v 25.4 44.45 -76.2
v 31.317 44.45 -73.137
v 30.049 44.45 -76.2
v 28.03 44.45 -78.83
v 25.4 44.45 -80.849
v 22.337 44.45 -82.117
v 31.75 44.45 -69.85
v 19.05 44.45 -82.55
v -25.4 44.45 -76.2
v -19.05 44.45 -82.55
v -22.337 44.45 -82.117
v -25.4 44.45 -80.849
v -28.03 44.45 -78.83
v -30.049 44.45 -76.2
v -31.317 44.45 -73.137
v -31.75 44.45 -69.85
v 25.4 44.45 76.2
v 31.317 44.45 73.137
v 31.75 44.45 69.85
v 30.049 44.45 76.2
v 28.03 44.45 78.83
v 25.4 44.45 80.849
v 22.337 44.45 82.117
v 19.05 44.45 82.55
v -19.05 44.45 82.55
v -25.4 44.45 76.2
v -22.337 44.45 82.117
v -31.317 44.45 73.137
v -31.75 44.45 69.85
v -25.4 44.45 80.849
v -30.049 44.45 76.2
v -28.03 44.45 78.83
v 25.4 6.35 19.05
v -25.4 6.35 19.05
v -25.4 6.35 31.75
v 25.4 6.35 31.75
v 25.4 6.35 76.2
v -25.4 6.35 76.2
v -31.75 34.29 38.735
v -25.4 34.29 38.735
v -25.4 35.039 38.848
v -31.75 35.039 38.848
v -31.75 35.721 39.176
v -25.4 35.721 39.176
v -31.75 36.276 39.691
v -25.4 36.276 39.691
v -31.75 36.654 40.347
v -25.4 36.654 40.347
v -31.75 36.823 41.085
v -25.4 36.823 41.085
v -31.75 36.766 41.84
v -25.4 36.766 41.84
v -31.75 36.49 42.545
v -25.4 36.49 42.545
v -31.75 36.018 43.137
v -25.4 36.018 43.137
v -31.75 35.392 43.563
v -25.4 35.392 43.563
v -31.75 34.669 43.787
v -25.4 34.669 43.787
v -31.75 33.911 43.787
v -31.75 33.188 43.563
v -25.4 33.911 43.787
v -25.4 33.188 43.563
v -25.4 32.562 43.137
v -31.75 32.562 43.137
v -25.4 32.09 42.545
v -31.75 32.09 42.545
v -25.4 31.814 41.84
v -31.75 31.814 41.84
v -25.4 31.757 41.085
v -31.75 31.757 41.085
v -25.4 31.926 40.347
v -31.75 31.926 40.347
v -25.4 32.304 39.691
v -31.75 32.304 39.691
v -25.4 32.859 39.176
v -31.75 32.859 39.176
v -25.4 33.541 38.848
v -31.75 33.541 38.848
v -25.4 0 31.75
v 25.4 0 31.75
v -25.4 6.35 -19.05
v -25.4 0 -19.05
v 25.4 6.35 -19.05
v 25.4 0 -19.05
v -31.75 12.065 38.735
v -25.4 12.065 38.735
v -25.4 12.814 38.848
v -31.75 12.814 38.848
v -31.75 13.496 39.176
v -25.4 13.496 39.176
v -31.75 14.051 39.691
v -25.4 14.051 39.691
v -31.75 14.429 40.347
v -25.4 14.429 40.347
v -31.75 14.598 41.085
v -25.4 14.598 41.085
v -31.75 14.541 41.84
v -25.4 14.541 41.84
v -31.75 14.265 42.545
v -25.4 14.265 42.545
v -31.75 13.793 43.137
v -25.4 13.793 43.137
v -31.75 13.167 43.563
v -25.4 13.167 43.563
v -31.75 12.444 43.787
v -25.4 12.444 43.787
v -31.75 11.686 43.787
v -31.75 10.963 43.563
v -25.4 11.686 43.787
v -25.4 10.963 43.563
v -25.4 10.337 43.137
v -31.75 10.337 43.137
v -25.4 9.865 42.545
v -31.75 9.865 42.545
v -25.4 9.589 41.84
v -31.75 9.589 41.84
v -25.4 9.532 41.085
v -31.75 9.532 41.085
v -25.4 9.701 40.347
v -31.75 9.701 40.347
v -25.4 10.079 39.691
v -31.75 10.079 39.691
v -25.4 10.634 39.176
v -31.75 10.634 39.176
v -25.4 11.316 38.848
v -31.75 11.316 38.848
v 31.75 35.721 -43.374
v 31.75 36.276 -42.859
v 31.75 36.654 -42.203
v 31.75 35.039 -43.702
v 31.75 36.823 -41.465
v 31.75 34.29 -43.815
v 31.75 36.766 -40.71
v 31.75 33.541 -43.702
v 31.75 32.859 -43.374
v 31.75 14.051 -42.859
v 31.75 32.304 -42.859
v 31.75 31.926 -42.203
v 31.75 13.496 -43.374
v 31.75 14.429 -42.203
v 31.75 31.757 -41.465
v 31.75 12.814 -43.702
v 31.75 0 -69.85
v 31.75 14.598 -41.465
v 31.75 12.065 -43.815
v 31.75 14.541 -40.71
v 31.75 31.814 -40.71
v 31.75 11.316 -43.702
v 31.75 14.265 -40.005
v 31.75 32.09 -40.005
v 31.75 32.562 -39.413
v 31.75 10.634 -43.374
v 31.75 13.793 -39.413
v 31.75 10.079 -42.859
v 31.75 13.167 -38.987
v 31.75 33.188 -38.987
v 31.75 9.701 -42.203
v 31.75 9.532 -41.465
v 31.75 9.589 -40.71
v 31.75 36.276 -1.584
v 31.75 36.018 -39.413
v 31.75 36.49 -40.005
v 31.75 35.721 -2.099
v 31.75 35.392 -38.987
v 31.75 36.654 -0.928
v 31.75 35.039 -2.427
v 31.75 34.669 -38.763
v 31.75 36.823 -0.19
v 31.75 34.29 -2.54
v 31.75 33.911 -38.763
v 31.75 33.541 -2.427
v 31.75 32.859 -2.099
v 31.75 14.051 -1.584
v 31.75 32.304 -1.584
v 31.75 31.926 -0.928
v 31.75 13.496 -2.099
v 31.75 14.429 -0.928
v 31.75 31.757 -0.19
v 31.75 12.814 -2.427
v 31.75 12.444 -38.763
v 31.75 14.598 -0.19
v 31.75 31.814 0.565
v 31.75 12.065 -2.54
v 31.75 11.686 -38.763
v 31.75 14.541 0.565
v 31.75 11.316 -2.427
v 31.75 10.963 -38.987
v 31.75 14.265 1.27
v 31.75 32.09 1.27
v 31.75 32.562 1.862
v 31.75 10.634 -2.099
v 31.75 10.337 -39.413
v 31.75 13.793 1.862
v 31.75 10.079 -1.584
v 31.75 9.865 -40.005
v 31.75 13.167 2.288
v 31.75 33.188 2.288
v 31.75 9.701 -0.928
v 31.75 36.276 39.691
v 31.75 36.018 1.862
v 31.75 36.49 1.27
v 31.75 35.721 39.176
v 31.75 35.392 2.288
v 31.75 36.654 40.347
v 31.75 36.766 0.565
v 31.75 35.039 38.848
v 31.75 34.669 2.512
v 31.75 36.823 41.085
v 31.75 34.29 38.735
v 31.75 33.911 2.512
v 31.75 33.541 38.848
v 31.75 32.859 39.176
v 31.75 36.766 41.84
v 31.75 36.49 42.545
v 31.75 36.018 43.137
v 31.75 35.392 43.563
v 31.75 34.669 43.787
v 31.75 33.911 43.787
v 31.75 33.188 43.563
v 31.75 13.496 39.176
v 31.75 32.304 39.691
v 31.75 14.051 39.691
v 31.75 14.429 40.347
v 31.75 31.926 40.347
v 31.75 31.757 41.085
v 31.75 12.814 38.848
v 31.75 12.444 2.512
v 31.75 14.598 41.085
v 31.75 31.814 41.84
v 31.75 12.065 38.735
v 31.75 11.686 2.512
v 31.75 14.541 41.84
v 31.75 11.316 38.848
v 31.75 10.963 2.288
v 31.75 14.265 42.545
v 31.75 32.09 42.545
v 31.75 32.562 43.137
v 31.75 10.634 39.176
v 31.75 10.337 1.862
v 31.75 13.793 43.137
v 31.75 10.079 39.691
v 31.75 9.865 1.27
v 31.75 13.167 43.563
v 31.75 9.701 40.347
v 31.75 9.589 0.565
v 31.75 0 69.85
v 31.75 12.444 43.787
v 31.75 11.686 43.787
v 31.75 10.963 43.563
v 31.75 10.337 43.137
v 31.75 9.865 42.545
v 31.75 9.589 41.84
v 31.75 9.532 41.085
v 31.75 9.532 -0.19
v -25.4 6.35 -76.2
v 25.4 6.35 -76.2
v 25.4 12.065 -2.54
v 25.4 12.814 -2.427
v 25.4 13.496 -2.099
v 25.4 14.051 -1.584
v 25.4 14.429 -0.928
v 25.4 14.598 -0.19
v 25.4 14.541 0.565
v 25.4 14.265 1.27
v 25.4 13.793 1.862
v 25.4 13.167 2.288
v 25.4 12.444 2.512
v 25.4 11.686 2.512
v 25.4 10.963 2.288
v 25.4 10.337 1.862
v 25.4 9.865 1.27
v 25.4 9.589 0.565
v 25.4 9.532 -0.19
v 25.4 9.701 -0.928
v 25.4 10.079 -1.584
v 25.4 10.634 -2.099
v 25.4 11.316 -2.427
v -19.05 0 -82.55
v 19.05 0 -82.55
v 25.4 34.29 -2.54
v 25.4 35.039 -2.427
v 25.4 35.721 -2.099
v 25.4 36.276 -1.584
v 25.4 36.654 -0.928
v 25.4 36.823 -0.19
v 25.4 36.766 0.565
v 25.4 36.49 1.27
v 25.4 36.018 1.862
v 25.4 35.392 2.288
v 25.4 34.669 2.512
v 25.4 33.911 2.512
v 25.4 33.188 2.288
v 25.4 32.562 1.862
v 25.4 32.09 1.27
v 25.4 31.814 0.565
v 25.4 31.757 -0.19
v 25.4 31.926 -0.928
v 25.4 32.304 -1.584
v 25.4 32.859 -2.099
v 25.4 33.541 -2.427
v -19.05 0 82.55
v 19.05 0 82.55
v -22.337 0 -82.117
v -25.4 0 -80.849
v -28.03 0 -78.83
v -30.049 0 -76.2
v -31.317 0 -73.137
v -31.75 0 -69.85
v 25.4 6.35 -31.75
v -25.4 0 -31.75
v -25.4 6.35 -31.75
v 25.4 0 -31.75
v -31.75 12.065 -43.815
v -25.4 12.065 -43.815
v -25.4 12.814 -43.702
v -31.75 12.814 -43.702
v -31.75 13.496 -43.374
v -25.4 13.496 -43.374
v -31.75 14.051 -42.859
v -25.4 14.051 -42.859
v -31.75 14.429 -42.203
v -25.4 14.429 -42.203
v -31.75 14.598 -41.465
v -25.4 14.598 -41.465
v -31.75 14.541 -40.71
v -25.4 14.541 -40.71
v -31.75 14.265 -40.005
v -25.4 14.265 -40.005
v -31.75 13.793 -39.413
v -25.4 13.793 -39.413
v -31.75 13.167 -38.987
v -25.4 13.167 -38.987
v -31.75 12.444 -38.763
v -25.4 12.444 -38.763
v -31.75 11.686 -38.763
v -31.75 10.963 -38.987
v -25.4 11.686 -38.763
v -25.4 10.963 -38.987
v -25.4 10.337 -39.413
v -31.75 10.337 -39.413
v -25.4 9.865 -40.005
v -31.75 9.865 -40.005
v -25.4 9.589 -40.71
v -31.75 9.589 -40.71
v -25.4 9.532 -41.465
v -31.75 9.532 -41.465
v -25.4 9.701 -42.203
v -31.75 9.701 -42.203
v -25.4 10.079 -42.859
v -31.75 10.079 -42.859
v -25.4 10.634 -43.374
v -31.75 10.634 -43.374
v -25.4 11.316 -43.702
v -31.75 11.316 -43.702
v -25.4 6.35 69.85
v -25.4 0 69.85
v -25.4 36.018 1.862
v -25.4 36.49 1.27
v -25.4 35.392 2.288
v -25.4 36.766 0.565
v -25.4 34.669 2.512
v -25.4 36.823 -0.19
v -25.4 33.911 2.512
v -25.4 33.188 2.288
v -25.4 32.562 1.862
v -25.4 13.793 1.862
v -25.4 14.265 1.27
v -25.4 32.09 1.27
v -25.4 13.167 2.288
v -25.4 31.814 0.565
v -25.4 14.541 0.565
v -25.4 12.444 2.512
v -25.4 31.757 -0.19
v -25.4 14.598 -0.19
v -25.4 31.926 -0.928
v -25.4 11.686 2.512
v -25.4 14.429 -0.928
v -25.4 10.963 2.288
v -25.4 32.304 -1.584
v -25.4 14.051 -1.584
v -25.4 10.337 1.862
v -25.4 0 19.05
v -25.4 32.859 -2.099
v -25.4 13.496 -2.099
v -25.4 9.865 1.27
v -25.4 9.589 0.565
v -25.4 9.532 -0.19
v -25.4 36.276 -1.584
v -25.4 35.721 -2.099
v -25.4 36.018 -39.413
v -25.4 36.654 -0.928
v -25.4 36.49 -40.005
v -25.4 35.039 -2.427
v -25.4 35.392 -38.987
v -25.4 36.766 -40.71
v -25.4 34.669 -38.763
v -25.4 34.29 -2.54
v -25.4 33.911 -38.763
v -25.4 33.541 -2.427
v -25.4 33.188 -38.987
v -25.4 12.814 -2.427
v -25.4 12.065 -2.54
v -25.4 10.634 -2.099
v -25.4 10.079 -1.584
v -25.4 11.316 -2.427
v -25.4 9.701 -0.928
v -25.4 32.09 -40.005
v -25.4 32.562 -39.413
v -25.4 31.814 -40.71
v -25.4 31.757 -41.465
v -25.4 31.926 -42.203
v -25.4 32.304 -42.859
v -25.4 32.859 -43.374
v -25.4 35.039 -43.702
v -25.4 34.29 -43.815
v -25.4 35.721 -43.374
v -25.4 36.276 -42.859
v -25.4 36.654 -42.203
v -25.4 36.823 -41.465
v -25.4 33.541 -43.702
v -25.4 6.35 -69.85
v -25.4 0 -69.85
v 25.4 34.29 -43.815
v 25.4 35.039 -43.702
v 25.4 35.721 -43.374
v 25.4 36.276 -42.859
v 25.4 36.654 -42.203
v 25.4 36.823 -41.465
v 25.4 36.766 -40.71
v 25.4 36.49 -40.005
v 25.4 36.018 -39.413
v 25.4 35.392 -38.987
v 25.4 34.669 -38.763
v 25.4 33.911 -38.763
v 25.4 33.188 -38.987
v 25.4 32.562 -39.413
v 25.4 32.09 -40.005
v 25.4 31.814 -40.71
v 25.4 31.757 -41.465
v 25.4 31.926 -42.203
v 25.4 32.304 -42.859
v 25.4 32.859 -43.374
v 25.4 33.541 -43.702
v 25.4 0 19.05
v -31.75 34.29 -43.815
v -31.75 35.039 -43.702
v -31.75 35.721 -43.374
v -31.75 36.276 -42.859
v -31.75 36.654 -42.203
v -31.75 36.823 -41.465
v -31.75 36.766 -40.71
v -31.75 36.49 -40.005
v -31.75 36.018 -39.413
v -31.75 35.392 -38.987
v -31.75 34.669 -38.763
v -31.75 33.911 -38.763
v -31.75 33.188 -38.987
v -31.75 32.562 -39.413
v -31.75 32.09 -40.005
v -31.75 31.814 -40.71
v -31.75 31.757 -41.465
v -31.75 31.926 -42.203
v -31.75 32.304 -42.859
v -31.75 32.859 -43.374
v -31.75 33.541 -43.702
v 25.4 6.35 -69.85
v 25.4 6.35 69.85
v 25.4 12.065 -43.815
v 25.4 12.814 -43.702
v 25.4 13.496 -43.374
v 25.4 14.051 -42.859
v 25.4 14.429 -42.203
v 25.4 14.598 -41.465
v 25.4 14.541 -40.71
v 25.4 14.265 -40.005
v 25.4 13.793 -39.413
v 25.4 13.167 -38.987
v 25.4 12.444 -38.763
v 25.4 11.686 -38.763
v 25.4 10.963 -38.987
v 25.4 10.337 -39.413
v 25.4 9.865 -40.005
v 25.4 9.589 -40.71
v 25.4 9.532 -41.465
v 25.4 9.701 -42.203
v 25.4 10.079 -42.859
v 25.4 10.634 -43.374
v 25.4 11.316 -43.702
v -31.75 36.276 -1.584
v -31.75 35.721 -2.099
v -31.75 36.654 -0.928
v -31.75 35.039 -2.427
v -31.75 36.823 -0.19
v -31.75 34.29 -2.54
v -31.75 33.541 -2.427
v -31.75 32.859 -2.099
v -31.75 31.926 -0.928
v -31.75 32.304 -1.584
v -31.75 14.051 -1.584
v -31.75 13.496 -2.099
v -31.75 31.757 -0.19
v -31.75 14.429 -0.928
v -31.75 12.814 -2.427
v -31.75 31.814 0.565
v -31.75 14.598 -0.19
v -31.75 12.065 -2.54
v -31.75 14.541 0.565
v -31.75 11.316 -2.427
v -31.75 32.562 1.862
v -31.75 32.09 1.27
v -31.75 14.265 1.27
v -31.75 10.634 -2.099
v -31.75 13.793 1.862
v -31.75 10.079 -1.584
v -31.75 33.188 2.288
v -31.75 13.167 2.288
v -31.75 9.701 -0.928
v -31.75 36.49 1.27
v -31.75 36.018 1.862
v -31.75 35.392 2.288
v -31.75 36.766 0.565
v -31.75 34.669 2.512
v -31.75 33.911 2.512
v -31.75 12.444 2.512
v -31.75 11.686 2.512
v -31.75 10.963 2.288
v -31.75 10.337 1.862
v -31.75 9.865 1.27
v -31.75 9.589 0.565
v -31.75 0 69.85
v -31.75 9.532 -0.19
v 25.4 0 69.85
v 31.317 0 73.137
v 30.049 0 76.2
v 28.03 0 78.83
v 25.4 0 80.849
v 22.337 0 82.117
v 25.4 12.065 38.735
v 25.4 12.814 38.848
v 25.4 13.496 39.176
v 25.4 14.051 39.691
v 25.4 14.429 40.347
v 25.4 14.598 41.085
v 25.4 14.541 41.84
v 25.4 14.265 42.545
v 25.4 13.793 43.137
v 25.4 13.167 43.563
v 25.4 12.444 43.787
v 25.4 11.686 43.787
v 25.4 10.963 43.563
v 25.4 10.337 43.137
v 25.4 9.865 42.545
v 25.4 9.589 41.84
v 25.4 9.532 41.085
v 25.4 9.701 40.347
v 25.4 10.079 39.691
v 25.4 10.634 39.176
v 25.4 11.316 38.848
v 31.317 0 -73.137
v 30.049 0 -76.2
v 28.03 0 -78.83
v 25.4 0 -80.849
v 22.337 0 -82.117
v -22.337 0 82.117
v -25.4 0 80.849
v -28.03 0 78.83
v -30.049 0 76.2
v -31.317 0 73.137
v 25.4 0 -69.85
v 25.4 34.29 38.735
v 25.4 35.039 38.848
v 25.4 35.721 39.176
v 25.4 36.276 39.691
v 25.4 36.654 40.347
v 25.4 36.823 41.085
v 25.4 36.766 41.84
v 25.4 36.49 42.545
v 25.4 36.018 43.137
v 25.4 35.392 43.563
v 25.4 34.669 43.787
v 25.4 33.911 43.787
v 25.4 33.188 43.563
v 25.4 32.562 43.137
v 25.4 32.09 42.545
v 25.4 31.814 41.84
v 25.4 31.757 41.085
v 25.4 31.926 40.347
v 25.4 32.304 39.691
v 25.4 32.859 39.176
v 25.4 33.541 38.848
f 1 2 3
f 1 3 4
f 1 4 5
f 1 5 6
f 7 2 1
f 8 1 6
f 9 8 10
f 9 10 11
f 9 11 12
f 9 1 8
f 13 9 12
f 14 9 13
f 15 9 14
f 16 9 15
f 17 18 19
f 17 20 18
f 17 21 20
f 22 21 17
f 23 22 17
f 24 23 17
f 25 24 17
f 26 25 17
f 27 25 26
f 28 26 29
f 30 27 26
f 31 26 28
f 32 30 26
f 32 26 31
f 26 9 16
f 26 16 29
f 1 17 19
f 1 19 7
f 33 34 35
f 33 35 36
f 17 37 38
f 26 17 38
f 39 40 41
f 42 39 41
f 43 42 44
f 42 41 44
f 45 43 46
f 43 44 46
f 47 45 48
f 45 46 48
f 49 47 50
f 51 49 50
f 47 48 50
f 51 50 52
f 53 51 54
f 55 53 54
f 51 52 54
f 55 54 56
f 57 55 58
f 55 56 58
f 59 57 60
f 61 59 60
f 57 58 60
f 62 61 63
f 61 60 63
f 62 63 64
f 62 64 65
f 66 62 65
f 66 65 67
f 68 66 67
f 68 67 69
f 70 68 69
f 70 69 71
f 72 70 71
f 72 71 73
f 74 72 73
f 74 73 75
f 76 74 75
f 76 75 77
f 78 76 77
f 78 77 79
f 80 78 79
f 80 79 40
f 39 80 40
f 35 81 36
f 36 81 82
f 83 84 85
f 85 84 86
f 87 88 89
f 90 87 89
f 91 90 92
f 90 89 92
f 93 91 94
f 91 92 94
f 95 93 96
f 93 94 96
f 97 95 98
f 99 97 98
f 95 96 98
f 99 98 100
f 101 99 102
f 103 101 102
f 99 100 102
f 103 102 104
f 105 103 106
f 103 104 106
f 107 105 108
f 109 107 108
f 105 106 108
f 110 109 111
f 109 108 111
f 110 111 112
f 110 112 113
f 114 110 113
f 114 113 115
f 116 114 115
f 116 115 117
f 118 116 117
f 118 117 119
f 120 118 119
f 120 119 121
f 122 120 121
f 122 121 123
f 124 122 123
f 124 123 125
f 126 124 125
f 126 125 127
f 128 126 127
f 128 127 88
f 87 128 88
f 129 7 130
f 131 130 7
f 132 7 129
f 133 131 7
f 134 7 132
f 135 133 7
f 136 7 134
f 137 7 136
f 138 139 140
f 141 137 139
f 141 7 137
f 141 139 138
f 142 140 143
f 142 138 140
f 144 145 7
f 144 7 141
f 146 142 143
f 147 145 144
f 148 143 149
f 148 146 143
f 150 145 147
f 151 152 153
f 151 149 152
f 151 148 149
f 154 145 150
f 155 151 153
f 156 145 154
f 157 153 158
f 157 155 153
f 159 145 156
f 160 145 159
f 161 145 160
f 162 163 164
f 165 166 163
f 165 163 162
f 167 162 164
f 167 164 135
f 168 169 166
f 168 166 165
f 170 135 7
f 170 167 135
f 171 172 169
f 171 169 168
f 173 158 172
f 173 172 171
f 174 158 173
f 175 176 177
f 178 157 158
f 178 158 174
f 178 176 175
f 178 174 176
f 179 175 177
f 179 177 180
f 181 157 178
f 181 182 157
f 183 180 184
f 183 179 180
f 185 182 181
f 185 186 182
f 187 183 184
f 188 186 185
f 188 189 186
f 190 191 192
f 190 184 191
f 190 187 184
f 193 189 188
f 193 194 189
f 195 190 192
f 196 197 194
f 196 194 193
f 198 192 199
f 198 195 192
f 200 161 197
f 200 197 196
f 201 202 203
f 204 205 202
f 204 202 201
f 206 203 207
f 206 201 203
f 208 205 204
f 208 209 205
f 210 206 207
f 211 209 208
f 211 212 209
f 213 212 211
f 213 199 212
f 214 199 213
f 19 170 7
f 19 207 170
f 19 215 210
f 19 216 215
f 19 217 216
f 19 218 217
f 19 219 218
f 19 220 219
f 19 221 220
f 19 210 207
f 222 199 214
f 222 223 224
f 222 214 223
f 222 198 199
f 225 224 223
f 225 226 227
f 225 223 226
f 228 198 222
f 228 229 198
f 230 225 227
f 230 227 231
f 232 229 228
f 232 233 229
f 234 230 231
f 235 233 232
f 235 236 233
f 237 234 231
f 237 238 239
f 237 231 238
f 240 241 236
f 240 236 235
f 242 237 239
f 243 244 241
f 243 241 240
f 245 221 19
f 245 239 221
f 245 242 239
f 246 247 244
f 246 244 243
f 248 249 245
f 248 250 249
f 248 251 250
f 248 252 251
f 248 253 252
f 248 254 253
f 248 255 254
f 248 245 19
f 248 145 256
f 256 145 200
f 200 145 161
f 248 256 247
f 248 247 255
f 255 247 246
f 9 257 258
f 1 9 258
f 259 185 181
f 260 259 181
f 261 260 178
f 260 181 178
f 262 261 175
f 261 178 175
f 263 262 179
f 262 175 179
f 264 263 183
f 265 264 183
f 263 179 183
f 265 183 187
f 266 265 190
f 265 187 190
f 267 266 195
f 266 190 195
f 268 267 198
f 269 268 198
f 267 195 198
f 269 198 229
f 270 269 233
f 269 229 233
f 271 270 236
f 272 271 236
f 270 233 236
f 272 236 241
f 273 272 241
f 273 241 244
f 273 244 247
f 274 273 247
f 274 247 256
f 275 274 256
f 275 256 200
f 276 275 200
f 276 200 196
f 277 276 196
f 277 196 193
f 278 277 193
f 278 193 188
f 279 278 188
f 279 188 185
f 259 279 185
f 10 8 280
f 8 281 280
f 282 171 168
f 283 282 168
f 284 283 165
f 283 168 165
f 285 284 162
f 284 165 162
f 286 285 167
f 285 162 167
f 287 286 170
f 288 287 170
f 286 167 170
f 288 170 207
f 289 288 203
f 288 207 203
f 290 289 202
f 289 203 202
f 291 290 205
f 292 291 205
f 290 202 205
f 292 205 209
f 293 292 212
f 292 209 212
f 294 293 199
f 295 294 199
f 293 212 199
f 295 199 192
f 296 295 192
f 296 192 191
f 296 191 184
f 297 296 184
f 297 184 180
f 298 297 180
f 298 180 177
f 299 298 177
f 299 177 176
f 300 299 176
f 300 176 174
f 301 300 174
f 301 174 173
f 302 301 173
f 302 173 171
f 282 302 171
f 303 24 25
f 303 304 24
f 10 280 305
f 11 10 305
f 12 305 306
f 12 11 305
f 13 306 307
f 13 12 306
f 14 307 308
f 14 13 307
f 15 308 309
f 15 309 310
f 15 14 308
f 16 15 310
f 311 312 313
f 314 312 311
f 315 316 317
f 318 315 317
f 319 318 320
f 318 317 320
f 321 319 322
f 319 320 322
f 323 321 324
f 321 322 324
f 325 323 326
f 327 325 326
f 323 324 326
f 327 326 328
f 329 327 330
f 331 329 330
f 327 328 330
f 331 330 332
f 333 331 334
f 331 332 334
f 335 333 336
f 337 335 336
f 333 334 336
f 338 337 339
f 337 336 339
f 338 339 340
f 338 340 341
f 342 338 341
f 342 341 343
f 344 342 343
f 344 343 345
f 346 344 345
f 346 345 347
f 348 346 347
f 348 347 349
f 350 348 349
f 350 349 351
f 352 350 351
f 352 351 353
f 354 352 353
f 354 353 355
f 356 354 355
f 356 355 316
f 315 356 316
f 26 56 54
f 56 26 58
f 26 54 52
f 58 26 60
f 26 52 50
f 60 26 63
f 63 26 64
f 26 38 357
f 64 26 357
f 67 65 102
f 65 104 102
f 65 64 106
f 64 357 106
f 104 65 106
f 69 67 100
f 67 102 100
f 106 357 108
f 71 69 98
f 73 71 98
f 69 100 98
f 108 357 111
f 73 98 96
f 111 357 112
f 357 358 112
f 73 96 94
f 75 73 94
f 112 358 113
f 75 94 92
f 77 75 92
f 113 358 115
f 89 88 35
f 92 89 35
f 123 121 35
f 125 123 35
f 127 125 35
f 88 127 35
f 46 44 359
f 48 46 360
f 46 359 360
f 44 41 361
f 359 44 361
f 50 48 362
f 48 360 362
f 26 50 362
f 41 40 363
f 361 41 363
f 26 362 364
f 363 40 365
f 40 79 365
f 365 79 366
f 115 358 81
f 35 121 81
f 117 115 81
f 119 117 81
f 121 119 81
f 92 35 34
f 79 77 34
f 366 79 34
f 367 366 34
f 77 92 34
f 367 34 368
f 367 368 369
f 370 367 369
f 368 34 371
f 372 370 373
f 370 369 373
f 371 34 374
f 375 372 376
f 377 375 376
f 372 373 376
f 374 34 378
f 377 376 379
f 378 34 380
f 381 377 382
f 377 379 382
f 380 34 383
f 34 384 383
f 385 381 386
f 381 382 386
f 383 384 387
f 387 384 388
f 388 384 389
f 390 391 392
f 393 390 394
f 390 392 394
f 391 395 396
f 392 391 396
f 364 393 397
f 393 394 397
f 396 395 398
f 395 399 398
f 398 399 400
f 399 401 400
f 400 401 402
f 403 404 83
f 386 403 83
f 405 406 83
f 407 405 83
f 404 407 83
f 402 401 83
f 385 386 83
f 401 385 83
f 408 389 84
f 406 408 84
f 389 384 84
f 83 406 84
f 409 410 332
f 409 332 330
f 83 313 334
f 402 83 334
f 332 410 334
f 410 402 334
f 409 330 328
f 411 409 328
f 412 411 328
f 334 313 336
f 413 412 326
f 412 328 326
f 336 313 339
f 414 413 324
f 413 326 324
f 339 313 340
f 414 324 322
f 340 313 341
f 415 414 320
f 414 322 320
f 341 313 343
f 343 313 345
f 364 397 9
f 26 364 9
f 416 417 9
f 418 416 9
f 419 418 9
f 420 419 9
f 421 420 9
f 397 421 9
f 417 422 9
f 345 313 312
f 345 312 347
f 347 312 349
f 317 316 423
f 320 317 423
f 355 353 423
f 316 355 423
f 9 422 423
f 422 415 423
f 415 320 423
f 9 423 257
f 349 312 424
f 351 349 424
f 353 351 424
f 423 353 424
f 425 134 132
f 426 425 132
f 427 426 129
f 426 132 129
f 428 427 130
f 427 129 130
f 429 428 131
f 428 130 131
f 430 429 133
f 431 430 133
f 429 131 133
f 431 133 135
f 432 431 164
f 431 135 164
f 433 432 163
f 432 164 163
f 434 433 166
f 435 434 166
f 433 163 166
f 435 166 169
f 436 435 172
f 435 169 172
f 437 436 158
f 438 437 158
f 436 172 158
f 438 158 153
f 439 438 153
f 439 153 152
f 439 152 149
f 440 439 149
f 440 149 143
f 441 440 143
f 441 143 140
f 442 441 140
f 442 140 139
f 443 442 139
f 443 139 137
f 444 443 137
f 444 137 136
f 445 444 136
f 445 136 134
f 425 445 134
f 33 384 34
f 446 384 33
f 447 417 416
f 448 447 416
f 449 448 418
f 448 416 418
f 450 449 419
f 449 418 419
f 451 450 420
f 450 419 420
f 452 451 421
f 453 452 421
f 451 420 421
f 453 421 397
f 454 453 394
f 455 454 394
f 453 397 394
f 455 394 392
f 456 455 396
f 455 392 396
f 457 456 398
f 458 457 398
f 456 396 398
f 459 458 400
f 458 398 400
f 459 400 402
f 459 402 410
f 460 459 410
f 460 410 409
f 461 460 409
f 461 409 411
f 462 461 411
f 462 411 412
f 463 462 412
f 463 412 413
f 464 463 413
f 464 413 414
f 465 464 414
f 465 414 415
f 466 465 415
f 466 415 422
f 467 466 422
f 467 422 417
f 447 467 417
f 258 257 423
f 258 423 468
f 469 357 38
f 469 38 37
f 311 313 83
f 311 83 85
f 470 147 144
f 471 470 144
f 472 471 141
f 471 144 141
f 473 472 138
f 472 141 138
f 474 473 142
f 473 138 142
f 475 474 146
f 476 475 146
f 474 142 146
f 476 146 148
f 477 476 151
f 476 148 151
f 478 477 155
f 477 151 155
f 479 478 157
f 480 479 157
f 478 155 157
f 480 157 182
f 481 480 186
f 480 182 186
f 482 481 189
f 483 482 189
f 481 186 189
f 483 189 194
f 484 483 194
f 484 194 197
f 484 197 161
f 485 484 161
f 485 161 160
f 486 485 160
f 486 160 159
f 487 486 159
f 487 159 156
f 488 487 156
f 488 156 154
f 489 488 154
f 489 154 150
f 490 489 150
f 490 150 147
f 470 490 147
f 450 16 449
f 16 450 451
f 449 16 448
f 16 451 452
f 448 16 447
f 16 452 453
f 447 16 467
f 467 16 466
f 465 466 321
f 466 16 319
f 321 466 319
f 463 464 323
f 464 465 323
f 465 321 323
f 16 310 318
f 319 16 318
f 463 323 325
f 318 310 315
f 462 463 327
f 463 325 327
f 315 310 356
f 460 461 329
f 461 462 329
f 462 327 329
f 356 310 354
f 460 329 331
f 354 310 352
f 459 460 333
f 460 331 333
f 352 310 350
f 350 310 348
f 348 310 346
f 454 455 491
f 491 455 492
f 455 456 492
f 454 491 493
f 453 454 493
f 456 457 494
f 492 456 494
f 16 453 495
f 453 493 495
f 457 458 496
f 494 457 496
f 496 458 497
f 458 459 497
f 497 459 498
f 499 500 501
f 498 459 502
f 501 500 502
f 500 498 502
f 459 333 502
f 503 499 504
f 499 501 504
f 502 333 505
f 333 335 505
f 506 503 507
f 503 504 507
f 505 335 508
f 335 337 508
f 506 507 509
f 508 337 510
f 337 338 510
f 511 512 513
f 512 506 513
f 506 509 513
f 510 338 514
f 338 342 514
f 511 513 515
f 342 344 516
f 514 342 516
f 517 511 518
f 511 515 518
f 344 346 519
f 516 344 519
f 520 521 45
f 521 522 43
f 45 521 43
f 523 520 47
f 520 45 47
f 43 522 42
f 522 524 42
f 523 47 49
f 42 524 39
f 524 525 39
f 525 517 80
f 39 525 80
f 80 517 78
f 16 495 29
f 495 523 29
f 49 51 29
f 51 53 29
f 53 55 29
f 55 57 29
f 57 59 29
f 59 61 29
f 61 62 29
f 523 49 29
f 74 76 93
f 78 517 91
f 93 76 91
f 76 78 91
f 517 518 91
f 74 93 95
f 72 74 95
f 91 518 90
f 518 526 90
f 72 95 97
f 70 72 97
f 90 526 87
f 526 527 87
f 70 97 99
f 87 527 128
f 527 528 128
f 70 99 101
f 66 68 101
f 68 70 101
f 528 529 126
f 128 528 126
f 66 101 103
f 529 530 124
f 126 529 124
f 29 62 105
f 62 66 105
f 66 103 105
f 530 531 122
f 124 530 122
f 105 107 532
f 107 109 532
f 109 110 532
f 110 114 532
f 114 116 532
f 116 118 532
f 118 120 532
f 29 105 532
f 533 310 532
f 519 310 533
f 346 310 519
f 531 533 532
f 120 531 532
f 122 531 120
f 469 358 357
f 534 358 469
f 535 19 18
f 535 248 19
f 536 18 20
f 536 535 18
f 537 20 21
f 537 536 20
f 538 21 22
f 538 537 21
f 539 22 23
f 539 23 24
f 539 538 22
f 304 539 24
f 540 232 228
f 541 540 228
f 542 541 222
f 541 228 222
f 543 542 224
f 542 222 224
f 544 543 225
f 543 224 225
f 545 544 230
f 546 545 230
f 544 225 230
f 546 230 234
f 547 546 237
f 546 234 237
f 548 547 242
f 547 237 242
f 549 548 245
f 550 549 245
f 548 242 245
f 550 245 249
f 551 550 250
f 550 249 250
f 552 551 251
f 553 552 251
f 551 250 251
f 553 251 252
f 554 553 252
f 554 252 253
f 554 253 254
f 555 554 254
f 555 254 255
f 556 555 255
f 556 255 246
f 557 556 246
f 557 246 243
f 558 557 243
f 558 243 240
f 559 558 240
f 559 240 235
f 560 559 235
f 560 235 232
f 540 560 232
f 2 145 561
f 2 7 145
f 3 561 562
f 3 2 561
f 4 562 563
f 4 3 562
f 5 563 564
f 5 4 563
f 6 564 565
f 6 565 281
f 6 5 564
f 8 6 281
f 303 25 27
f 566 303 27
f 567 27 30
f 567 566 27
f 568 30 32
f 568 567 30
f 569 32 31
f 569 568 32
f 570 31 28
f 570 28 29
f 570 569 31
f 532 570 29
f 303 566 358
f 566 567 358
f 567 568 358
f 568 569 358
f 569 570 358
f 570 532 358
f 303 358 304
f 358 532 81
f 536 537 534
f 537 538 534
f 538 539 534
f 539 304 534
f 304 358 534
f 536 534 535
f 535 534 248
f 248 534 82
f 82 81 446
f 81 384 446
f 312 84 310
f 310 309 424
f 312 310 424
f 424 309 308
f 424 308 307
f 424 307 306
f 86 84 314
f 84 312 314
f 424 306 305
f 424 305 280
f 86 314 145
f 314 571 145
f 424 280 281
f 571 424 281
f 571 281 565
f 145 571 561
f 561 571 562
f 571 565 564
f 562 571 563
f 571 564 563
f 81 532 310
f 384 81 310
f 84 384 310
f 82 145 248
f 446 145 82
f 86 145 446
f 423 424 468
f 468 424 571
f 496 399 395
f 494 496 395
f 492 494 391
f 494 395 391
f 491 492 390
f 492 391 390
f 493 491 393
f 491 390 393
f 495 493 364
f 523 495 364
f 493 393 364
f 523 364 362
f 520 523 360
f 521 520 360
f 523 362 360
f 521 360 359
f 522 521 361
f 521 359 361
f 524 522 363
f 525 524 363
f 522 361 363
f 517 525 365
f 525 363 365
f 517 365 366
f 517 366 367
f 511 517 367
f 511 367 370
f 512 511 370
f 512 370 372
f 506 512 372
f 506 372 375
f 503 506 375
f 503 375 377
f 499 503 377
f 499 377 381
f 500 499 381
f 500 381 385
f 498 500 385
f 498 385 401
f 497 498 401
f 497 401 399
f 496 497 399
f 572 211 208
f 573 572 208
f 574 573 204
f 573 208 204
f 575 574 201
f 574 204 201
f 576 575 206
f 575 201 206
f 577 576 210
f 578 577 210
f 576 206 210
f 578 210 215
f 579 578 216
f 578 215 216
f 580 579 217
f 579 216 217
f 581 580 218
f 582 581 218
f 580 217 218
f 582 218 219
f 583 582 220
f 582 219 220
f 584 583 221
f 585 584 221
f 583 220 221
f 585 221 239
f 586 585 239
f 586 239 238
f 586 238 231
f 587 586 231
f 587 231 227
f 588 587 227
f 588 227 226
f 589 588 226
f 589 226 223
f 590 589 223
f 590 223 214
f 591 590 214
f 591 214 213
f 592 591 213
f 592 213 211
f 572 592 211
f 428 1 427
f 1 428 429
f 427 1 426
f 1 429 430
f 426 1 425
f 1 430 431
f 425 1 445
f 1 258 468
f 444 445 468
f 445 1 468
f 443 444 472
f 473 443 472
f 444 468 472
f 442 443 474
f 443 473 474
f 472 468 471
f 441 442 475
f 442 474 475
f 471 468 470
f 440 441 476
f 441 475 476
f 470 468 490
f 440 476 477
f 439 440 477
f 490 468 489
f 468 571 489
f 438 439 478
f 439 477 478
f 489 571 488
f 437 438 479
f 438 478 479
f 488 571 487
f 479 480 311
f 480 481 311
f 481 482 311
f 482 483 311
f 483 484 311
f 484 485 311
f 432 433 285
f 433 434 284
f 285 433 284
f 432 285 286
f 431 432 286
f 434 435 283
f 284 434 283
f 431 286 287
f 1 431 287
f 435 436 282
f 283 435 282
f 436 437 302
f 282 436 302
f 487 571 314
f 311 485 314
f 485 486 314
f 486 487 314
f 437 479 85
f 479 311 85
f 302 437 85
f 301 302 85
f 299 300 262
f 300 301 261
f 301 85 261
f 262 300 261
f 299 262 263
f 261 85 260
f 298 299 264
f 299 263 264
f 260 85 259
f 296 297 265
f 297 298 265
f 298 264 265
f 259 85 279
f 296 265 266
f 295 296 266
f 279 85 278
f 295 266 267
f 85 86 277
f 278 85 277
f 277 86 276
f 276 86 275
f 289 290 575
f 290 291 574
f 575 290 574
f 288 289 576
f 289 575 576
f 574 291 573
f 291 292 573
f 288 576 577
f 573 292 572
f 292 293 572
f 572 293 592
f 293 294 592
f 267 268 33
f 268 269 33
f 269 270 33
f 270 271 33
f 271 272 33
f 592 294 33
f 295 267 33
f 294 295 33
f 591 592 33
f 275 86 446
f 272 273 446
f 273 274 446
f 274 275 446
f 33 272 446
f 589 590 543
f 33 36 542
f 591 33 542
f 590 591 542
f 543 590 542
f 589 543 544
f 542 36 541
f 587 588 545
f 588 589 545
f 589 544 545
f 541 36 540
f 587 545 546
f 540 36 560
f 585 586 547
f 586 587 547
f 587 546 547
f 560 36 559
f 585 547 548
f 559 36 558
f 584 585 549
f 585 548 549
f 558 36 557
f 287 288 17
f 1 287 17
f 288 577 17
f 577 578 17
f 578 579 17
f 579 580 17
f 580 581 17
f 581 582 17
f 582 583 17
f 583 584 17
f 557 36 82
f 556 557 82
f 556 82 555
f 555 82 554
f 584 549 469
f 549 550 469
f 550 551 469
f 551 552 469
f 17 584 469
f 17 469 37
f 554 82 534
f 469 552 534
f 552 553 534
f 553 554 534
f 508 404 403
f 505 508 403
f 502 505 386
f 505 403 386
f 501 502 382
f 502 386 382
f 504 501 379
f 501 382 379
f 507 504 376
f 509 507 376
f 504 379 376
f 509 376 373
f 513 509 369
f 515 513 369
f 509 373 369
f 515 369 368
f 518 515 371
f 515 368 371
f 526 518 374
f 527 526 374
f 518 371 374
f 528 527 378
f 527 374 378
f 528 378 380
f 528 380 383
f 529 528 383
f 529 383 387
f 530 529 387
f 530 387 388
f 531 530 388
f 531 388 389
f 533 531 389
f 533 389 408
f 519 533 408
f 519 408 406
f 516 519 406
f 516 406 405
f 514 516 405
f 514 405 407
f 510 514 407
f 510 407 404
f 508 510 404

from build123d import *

# Parameters (mm, degrees)
SKETCH1_W           = 50.8
SKETCH1_H           = 38.1
MOUNT_BASE_DEPTH    = 6.35
SKETCH5_W           = 63.5
SKETCH5_H           = 165.1
BOSS_EXTRUDE2_DEPTH = 38.1
SKETCH4_R           = 2.54
CUT_EXTRUDE1_DEPTH  = 114.236721076
OUTSIDE_VERTICES_R  = 12.7


with BuildPart() as part:
    # Sketch1 → Mount Base (new body)
    with BuildSketch(Plane(origin=(0, 0, 0), x_dir=(1, 0, 0), z_dir=(0, 1, 0))):
        Polygon((-31.75, 82.55), (-31.75, -82.55), (31.75, -82.55), (31.75, 82.55), (25.4, 82.55), align=None)
        with Locations((0, -50.8)):
            Rectangle(SKETCH1_W, SKETCH1_H, mode=Mode.SUBTRACT)
        Rectangle(SKETCH1_W, SKETCH1_H, mode=Mode.SUBTRACT)
        with Locations((0, 50.8)):
            Rectangle(SKETCH1_W, SKETCH1_H, mode=Mode.SUBTRACT)
    extrude(amount=MOUNT_BASE_DEPTH)

    # Sketch5 → Boss-Extrude2 (add)
    with BuildSketch(Plane(origin=(0, 6.35, 0), x_dir=(-1, 0, 0), z_dir=(0, 1, 0))):
        Rectangle(SKETCH5_W, SKETCH5_H)
        Polygon((25.4, -76.2), (-25.4, -76.2), (-25.4, -69.85), (-25.4, -31.75), (-25.4, -19.05), (-25.4, 19.05), (-25.4, 31.75), (-25.4, 69.85), (-25.4, 76.2), (25.4, 76.2), (25.4, 69.85), (25.4, 31.75), (25.4, 19.05), (25.4, -19.05), (25.4, -31.75), (25.4, -69.85), align=None, mode=Mode.SUBTRACT)
    extrude(amount=BOSS_EXTRUDE2_DEPTH)

    # Sketch4 → Cut-Extrude1 (cut, through all)
    with BuildSketch(Plane(origin=(31.75, 0, 0), x_dir=(0, 0, -1), z_dir=(1, 0, 0))):
        with Locations((0, 34.29)):
            Circle(SKETCH4_R)
        with Locations((41.275, 34.29)):
            Circle(SKETCH4_R)
        with Locations((-41.275, 34.29)):
            Circle(SKETCH4_R)
        with Locations((-41.275, 12.065)):
            Circle(SKETCH4_R)
        with Locations((41.275, 12.065)):
            Circle(SKETCH4_R)
        with Locations((0, 12.065)):
            Circle(SKETCH4_R)
    extrude(amount=-CUT_EXTRUDE1_DEPTH, mode=Mode.SUBTRACT)

    # Outside Vertices
    outside_vertices_edges = [part.edges().sort_by_distance(p)[0] for p in [
        (31.75, 22.225, 82.55),
        (-31.75, 22.225, 82.55),
        (-31.75, 22.225, -82.55),
        (31.75, 22.225, -82.55),
    ]]
    fillet(outside_vertices_edges, radius=OUTSIDE_VERTICES_R)


solid = part.part
